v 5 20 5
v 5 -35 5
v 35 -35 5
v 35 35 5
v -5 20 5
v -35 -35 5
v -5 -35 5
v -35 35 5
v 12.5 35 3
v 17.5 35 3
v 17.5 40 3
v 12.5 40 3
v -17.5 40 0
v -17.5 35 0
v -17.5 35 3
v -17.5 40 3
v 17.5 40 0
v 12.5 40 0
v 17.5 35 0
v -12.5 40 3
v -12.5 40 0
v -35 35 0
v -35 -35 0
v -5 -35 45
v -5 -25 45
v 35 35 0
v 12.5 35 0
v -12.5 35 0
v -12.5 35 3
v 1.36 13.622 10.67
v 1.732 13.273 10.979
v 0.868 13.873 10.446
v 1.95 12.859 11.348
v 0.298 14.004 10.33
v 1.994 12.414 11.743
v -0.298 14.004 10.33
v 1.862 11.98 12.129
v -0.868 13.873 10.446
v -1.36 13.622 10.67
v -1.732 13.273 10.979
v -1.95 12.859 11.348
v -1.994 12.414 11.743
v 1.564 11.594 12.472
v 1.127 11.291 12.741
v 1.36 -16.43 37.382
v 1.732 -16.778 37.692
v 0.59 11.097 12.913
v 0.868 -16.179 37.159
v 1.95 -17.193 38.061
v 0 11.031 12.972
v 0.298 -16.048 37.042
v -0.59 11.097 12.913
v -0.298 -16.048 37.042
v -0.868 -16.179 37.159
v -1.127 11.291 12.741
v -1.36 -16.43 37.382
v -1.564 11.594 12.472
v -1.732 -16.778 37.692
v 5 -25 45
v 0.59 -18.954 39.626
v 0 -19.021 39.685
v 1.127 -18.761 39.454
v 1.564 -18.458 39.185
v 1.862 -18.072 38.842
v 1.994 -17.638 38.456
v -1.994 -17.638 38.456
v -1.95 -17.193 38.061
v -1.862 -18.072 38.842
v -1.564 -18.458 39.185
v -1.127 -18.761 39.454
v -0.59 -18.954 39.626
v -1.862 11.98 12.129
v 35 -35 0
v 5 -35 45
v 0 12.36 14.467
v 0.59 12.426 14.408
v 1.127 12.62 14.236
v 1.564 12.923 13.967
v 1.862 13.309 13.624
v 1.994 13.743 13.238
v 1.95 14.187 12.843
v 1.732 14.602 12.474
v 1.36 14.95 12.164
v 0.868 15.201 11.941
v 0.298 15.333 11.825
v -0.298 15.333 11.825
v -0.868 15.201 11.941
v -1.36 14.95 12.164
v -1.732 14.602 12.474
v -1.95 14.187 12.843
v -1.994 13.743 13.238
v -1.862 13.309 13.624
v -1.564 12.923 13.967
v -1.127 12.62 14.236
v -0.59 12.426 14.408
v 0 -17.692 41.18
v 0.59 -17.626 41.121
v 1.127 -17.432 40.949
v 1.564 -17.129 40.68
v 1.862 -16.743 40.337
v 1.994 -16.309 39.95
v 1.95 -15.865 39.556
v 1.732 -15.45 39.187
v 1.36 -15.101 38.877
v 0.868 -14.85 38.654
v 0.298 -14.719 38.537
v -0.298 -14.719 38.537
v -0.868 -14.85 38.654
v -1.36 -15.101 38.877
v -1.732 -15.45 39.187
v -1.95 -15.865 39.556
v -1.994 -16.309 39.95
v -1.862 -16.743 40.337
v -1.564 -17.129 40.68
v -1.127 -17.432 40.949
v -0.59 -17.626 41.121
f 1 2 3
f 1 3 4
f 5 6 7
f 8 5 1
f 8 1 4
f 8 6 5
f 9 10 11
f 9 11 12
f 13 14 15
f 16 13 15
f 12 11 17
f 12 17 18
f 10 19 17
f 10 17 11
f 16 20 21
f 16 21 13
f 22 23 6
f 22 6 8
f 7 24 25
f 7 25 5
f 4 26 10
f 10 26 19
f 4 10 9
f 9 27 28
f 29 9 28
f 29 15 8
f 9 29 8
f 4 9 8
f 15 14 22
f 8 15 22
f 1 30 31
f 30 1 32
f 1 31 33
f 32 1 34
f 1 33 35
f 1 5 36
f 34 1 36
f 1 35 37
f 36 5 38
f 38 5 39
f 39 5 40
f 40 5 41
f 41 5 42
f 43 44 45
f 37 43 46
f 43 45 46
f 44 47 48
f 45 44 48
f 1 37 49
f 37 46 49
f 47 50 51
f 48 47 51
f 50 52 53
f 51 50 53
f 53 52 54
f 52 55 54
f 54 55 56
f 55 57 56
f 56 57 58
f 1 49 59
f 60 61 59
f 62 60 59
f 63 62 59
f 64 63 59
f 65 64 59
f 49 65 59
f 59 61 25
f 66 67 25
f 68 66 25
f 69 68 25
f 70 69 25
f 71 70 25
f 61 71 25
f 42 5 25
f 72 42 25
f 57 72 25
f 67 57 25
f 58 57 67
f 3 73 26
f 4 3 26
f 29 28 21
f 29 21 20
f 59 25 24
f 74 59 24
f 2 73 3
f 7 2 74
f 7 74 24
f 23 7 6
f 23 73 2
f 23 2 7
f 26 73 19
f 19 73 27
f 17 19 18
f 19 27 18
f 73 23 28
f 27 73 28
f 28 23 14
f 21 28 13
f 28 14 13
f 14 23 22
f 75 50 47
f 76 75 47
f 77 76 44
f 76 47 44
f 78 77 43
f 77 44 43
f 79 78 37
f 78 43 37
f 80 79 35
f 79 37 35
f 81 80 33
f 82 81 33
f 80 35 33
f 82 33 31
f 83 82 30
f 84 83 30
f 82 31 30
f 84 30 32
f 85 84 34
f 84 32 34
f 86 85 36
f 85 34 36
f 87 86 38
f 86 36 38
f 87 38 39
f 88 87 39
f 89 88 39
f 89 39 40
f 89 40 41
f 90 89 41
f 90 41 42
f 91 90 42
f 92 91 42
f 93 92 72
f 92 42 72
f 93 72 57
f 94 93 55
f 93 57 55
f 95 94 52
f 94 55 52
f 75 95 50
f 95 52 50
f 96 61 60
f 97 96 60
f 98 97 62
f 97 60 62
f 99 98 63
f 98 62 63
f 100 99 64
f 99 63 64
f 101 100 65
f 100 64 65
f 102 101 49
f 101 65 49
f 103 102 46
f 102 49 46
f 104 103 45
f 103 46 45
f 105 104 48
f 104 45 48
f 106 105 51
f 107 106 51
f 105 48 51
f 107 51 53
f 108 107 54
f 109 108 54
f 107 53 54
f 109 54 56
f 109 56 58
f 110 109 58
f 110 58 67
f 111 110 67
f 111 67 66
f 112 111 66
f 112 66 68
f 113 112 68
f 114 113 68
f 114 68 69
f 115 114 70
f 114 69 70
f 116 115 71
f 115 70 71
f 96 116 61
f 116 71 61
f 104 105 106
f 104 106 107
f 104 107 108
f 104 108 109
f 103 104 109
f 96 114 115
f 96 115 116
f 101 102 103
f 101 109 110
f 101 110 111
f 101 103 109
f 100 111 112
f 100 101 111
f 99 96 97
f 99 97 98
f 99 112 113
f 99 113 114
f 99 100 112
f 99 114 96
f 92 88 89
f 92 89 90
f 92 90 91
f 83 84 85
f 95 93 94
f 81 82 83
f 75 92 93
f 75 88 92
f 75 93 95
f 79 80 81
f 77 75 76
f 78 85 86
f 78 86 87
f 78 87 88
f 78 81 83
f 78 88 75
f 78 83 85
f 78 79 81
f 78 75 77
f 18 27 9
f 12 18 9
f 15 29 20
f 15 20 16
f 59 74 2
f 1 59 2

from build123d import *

# Parameters (mm, degrees)
SKETCH1_W                = 70
SKETCH1_H                = 70
BOSS_EXTRUDE1_DEPTH      = 5
SKETCH2_W                = 5
SKETCH2_H                = 3
BOSS_EXTRUDE2_DEPTH      = 5
BOSS_EXTRUDE6_DEPTH      = 5
BOSS_EXTRUDE6_DEPTH_BACK = 5
SKETCH16_R               = 2
BOSS_EXTRUDE10_DEPTH     = 2


with BuildPart() as part:
    # Sketch1 → Boss-Extrude1 (new body)
    with BuildSketch(Plane(origin=(0, 0, 0), x_dir=(0, 1, 0), z_dir=(0, 0, 1))):
        Rectangle(SKETCH1_W, SKETCH1_H)
    extrude(amount=BOSS_EXTRUDE1_DEPTH)

    # Sketch2 → Boss-Extrude2 (add)
    with BuildSketch(Plane(origin=(0, 35, 0), x_dir=(-1, 0, 0), z_dir=(0, 1, 0))):
        with Locations((-15, 1.5)):
            Rectangle(SKETCH2_W, SKETCH2_H)
        with Locations((15, 1.5)):
            Rectangle(SKETCH2_W, SKETCH2_H)
    extrude(amount=BOSS_EXTRUDE2_DEPTH)

    # Sketch10 → Boss-Extrude6 (add, two sides: drawn at the far end of the back side and taken through both)
    with BuildSketch(Plane.YZ.offset(-BOSS_EXTRUDE6_DEPTH_BACK)):
        Polygon((20, 5), (-25, 45), (-35, 45), (-35, 5), align=None)
    extrude(amount=BOSS_EXTRUDE6_DEPTH + BOSS_EXTRUDE6_DEPTH_BACK)

    # Sketch16 → Boss-Extrude10 (add)
    with BuildSketch(Plane(origin=(0, 11.310344828, 12.724137931), x_dir=(1, 0, 0), z_dir=(0, 0.6643638388299197, 0.7474093186836598))):
        with Locations(Location((0, 1.62636718, 0), (0, 0, 270))):
            Circle(SKETCH16_R)
        with Locations(Location((0, -38.581605714, 0), (0, 0, 270))):
            Circle(SKETCH16_R)
    extrude(amount=BOSS_EXTRUDE10_DEPTH)


solid = part.part
